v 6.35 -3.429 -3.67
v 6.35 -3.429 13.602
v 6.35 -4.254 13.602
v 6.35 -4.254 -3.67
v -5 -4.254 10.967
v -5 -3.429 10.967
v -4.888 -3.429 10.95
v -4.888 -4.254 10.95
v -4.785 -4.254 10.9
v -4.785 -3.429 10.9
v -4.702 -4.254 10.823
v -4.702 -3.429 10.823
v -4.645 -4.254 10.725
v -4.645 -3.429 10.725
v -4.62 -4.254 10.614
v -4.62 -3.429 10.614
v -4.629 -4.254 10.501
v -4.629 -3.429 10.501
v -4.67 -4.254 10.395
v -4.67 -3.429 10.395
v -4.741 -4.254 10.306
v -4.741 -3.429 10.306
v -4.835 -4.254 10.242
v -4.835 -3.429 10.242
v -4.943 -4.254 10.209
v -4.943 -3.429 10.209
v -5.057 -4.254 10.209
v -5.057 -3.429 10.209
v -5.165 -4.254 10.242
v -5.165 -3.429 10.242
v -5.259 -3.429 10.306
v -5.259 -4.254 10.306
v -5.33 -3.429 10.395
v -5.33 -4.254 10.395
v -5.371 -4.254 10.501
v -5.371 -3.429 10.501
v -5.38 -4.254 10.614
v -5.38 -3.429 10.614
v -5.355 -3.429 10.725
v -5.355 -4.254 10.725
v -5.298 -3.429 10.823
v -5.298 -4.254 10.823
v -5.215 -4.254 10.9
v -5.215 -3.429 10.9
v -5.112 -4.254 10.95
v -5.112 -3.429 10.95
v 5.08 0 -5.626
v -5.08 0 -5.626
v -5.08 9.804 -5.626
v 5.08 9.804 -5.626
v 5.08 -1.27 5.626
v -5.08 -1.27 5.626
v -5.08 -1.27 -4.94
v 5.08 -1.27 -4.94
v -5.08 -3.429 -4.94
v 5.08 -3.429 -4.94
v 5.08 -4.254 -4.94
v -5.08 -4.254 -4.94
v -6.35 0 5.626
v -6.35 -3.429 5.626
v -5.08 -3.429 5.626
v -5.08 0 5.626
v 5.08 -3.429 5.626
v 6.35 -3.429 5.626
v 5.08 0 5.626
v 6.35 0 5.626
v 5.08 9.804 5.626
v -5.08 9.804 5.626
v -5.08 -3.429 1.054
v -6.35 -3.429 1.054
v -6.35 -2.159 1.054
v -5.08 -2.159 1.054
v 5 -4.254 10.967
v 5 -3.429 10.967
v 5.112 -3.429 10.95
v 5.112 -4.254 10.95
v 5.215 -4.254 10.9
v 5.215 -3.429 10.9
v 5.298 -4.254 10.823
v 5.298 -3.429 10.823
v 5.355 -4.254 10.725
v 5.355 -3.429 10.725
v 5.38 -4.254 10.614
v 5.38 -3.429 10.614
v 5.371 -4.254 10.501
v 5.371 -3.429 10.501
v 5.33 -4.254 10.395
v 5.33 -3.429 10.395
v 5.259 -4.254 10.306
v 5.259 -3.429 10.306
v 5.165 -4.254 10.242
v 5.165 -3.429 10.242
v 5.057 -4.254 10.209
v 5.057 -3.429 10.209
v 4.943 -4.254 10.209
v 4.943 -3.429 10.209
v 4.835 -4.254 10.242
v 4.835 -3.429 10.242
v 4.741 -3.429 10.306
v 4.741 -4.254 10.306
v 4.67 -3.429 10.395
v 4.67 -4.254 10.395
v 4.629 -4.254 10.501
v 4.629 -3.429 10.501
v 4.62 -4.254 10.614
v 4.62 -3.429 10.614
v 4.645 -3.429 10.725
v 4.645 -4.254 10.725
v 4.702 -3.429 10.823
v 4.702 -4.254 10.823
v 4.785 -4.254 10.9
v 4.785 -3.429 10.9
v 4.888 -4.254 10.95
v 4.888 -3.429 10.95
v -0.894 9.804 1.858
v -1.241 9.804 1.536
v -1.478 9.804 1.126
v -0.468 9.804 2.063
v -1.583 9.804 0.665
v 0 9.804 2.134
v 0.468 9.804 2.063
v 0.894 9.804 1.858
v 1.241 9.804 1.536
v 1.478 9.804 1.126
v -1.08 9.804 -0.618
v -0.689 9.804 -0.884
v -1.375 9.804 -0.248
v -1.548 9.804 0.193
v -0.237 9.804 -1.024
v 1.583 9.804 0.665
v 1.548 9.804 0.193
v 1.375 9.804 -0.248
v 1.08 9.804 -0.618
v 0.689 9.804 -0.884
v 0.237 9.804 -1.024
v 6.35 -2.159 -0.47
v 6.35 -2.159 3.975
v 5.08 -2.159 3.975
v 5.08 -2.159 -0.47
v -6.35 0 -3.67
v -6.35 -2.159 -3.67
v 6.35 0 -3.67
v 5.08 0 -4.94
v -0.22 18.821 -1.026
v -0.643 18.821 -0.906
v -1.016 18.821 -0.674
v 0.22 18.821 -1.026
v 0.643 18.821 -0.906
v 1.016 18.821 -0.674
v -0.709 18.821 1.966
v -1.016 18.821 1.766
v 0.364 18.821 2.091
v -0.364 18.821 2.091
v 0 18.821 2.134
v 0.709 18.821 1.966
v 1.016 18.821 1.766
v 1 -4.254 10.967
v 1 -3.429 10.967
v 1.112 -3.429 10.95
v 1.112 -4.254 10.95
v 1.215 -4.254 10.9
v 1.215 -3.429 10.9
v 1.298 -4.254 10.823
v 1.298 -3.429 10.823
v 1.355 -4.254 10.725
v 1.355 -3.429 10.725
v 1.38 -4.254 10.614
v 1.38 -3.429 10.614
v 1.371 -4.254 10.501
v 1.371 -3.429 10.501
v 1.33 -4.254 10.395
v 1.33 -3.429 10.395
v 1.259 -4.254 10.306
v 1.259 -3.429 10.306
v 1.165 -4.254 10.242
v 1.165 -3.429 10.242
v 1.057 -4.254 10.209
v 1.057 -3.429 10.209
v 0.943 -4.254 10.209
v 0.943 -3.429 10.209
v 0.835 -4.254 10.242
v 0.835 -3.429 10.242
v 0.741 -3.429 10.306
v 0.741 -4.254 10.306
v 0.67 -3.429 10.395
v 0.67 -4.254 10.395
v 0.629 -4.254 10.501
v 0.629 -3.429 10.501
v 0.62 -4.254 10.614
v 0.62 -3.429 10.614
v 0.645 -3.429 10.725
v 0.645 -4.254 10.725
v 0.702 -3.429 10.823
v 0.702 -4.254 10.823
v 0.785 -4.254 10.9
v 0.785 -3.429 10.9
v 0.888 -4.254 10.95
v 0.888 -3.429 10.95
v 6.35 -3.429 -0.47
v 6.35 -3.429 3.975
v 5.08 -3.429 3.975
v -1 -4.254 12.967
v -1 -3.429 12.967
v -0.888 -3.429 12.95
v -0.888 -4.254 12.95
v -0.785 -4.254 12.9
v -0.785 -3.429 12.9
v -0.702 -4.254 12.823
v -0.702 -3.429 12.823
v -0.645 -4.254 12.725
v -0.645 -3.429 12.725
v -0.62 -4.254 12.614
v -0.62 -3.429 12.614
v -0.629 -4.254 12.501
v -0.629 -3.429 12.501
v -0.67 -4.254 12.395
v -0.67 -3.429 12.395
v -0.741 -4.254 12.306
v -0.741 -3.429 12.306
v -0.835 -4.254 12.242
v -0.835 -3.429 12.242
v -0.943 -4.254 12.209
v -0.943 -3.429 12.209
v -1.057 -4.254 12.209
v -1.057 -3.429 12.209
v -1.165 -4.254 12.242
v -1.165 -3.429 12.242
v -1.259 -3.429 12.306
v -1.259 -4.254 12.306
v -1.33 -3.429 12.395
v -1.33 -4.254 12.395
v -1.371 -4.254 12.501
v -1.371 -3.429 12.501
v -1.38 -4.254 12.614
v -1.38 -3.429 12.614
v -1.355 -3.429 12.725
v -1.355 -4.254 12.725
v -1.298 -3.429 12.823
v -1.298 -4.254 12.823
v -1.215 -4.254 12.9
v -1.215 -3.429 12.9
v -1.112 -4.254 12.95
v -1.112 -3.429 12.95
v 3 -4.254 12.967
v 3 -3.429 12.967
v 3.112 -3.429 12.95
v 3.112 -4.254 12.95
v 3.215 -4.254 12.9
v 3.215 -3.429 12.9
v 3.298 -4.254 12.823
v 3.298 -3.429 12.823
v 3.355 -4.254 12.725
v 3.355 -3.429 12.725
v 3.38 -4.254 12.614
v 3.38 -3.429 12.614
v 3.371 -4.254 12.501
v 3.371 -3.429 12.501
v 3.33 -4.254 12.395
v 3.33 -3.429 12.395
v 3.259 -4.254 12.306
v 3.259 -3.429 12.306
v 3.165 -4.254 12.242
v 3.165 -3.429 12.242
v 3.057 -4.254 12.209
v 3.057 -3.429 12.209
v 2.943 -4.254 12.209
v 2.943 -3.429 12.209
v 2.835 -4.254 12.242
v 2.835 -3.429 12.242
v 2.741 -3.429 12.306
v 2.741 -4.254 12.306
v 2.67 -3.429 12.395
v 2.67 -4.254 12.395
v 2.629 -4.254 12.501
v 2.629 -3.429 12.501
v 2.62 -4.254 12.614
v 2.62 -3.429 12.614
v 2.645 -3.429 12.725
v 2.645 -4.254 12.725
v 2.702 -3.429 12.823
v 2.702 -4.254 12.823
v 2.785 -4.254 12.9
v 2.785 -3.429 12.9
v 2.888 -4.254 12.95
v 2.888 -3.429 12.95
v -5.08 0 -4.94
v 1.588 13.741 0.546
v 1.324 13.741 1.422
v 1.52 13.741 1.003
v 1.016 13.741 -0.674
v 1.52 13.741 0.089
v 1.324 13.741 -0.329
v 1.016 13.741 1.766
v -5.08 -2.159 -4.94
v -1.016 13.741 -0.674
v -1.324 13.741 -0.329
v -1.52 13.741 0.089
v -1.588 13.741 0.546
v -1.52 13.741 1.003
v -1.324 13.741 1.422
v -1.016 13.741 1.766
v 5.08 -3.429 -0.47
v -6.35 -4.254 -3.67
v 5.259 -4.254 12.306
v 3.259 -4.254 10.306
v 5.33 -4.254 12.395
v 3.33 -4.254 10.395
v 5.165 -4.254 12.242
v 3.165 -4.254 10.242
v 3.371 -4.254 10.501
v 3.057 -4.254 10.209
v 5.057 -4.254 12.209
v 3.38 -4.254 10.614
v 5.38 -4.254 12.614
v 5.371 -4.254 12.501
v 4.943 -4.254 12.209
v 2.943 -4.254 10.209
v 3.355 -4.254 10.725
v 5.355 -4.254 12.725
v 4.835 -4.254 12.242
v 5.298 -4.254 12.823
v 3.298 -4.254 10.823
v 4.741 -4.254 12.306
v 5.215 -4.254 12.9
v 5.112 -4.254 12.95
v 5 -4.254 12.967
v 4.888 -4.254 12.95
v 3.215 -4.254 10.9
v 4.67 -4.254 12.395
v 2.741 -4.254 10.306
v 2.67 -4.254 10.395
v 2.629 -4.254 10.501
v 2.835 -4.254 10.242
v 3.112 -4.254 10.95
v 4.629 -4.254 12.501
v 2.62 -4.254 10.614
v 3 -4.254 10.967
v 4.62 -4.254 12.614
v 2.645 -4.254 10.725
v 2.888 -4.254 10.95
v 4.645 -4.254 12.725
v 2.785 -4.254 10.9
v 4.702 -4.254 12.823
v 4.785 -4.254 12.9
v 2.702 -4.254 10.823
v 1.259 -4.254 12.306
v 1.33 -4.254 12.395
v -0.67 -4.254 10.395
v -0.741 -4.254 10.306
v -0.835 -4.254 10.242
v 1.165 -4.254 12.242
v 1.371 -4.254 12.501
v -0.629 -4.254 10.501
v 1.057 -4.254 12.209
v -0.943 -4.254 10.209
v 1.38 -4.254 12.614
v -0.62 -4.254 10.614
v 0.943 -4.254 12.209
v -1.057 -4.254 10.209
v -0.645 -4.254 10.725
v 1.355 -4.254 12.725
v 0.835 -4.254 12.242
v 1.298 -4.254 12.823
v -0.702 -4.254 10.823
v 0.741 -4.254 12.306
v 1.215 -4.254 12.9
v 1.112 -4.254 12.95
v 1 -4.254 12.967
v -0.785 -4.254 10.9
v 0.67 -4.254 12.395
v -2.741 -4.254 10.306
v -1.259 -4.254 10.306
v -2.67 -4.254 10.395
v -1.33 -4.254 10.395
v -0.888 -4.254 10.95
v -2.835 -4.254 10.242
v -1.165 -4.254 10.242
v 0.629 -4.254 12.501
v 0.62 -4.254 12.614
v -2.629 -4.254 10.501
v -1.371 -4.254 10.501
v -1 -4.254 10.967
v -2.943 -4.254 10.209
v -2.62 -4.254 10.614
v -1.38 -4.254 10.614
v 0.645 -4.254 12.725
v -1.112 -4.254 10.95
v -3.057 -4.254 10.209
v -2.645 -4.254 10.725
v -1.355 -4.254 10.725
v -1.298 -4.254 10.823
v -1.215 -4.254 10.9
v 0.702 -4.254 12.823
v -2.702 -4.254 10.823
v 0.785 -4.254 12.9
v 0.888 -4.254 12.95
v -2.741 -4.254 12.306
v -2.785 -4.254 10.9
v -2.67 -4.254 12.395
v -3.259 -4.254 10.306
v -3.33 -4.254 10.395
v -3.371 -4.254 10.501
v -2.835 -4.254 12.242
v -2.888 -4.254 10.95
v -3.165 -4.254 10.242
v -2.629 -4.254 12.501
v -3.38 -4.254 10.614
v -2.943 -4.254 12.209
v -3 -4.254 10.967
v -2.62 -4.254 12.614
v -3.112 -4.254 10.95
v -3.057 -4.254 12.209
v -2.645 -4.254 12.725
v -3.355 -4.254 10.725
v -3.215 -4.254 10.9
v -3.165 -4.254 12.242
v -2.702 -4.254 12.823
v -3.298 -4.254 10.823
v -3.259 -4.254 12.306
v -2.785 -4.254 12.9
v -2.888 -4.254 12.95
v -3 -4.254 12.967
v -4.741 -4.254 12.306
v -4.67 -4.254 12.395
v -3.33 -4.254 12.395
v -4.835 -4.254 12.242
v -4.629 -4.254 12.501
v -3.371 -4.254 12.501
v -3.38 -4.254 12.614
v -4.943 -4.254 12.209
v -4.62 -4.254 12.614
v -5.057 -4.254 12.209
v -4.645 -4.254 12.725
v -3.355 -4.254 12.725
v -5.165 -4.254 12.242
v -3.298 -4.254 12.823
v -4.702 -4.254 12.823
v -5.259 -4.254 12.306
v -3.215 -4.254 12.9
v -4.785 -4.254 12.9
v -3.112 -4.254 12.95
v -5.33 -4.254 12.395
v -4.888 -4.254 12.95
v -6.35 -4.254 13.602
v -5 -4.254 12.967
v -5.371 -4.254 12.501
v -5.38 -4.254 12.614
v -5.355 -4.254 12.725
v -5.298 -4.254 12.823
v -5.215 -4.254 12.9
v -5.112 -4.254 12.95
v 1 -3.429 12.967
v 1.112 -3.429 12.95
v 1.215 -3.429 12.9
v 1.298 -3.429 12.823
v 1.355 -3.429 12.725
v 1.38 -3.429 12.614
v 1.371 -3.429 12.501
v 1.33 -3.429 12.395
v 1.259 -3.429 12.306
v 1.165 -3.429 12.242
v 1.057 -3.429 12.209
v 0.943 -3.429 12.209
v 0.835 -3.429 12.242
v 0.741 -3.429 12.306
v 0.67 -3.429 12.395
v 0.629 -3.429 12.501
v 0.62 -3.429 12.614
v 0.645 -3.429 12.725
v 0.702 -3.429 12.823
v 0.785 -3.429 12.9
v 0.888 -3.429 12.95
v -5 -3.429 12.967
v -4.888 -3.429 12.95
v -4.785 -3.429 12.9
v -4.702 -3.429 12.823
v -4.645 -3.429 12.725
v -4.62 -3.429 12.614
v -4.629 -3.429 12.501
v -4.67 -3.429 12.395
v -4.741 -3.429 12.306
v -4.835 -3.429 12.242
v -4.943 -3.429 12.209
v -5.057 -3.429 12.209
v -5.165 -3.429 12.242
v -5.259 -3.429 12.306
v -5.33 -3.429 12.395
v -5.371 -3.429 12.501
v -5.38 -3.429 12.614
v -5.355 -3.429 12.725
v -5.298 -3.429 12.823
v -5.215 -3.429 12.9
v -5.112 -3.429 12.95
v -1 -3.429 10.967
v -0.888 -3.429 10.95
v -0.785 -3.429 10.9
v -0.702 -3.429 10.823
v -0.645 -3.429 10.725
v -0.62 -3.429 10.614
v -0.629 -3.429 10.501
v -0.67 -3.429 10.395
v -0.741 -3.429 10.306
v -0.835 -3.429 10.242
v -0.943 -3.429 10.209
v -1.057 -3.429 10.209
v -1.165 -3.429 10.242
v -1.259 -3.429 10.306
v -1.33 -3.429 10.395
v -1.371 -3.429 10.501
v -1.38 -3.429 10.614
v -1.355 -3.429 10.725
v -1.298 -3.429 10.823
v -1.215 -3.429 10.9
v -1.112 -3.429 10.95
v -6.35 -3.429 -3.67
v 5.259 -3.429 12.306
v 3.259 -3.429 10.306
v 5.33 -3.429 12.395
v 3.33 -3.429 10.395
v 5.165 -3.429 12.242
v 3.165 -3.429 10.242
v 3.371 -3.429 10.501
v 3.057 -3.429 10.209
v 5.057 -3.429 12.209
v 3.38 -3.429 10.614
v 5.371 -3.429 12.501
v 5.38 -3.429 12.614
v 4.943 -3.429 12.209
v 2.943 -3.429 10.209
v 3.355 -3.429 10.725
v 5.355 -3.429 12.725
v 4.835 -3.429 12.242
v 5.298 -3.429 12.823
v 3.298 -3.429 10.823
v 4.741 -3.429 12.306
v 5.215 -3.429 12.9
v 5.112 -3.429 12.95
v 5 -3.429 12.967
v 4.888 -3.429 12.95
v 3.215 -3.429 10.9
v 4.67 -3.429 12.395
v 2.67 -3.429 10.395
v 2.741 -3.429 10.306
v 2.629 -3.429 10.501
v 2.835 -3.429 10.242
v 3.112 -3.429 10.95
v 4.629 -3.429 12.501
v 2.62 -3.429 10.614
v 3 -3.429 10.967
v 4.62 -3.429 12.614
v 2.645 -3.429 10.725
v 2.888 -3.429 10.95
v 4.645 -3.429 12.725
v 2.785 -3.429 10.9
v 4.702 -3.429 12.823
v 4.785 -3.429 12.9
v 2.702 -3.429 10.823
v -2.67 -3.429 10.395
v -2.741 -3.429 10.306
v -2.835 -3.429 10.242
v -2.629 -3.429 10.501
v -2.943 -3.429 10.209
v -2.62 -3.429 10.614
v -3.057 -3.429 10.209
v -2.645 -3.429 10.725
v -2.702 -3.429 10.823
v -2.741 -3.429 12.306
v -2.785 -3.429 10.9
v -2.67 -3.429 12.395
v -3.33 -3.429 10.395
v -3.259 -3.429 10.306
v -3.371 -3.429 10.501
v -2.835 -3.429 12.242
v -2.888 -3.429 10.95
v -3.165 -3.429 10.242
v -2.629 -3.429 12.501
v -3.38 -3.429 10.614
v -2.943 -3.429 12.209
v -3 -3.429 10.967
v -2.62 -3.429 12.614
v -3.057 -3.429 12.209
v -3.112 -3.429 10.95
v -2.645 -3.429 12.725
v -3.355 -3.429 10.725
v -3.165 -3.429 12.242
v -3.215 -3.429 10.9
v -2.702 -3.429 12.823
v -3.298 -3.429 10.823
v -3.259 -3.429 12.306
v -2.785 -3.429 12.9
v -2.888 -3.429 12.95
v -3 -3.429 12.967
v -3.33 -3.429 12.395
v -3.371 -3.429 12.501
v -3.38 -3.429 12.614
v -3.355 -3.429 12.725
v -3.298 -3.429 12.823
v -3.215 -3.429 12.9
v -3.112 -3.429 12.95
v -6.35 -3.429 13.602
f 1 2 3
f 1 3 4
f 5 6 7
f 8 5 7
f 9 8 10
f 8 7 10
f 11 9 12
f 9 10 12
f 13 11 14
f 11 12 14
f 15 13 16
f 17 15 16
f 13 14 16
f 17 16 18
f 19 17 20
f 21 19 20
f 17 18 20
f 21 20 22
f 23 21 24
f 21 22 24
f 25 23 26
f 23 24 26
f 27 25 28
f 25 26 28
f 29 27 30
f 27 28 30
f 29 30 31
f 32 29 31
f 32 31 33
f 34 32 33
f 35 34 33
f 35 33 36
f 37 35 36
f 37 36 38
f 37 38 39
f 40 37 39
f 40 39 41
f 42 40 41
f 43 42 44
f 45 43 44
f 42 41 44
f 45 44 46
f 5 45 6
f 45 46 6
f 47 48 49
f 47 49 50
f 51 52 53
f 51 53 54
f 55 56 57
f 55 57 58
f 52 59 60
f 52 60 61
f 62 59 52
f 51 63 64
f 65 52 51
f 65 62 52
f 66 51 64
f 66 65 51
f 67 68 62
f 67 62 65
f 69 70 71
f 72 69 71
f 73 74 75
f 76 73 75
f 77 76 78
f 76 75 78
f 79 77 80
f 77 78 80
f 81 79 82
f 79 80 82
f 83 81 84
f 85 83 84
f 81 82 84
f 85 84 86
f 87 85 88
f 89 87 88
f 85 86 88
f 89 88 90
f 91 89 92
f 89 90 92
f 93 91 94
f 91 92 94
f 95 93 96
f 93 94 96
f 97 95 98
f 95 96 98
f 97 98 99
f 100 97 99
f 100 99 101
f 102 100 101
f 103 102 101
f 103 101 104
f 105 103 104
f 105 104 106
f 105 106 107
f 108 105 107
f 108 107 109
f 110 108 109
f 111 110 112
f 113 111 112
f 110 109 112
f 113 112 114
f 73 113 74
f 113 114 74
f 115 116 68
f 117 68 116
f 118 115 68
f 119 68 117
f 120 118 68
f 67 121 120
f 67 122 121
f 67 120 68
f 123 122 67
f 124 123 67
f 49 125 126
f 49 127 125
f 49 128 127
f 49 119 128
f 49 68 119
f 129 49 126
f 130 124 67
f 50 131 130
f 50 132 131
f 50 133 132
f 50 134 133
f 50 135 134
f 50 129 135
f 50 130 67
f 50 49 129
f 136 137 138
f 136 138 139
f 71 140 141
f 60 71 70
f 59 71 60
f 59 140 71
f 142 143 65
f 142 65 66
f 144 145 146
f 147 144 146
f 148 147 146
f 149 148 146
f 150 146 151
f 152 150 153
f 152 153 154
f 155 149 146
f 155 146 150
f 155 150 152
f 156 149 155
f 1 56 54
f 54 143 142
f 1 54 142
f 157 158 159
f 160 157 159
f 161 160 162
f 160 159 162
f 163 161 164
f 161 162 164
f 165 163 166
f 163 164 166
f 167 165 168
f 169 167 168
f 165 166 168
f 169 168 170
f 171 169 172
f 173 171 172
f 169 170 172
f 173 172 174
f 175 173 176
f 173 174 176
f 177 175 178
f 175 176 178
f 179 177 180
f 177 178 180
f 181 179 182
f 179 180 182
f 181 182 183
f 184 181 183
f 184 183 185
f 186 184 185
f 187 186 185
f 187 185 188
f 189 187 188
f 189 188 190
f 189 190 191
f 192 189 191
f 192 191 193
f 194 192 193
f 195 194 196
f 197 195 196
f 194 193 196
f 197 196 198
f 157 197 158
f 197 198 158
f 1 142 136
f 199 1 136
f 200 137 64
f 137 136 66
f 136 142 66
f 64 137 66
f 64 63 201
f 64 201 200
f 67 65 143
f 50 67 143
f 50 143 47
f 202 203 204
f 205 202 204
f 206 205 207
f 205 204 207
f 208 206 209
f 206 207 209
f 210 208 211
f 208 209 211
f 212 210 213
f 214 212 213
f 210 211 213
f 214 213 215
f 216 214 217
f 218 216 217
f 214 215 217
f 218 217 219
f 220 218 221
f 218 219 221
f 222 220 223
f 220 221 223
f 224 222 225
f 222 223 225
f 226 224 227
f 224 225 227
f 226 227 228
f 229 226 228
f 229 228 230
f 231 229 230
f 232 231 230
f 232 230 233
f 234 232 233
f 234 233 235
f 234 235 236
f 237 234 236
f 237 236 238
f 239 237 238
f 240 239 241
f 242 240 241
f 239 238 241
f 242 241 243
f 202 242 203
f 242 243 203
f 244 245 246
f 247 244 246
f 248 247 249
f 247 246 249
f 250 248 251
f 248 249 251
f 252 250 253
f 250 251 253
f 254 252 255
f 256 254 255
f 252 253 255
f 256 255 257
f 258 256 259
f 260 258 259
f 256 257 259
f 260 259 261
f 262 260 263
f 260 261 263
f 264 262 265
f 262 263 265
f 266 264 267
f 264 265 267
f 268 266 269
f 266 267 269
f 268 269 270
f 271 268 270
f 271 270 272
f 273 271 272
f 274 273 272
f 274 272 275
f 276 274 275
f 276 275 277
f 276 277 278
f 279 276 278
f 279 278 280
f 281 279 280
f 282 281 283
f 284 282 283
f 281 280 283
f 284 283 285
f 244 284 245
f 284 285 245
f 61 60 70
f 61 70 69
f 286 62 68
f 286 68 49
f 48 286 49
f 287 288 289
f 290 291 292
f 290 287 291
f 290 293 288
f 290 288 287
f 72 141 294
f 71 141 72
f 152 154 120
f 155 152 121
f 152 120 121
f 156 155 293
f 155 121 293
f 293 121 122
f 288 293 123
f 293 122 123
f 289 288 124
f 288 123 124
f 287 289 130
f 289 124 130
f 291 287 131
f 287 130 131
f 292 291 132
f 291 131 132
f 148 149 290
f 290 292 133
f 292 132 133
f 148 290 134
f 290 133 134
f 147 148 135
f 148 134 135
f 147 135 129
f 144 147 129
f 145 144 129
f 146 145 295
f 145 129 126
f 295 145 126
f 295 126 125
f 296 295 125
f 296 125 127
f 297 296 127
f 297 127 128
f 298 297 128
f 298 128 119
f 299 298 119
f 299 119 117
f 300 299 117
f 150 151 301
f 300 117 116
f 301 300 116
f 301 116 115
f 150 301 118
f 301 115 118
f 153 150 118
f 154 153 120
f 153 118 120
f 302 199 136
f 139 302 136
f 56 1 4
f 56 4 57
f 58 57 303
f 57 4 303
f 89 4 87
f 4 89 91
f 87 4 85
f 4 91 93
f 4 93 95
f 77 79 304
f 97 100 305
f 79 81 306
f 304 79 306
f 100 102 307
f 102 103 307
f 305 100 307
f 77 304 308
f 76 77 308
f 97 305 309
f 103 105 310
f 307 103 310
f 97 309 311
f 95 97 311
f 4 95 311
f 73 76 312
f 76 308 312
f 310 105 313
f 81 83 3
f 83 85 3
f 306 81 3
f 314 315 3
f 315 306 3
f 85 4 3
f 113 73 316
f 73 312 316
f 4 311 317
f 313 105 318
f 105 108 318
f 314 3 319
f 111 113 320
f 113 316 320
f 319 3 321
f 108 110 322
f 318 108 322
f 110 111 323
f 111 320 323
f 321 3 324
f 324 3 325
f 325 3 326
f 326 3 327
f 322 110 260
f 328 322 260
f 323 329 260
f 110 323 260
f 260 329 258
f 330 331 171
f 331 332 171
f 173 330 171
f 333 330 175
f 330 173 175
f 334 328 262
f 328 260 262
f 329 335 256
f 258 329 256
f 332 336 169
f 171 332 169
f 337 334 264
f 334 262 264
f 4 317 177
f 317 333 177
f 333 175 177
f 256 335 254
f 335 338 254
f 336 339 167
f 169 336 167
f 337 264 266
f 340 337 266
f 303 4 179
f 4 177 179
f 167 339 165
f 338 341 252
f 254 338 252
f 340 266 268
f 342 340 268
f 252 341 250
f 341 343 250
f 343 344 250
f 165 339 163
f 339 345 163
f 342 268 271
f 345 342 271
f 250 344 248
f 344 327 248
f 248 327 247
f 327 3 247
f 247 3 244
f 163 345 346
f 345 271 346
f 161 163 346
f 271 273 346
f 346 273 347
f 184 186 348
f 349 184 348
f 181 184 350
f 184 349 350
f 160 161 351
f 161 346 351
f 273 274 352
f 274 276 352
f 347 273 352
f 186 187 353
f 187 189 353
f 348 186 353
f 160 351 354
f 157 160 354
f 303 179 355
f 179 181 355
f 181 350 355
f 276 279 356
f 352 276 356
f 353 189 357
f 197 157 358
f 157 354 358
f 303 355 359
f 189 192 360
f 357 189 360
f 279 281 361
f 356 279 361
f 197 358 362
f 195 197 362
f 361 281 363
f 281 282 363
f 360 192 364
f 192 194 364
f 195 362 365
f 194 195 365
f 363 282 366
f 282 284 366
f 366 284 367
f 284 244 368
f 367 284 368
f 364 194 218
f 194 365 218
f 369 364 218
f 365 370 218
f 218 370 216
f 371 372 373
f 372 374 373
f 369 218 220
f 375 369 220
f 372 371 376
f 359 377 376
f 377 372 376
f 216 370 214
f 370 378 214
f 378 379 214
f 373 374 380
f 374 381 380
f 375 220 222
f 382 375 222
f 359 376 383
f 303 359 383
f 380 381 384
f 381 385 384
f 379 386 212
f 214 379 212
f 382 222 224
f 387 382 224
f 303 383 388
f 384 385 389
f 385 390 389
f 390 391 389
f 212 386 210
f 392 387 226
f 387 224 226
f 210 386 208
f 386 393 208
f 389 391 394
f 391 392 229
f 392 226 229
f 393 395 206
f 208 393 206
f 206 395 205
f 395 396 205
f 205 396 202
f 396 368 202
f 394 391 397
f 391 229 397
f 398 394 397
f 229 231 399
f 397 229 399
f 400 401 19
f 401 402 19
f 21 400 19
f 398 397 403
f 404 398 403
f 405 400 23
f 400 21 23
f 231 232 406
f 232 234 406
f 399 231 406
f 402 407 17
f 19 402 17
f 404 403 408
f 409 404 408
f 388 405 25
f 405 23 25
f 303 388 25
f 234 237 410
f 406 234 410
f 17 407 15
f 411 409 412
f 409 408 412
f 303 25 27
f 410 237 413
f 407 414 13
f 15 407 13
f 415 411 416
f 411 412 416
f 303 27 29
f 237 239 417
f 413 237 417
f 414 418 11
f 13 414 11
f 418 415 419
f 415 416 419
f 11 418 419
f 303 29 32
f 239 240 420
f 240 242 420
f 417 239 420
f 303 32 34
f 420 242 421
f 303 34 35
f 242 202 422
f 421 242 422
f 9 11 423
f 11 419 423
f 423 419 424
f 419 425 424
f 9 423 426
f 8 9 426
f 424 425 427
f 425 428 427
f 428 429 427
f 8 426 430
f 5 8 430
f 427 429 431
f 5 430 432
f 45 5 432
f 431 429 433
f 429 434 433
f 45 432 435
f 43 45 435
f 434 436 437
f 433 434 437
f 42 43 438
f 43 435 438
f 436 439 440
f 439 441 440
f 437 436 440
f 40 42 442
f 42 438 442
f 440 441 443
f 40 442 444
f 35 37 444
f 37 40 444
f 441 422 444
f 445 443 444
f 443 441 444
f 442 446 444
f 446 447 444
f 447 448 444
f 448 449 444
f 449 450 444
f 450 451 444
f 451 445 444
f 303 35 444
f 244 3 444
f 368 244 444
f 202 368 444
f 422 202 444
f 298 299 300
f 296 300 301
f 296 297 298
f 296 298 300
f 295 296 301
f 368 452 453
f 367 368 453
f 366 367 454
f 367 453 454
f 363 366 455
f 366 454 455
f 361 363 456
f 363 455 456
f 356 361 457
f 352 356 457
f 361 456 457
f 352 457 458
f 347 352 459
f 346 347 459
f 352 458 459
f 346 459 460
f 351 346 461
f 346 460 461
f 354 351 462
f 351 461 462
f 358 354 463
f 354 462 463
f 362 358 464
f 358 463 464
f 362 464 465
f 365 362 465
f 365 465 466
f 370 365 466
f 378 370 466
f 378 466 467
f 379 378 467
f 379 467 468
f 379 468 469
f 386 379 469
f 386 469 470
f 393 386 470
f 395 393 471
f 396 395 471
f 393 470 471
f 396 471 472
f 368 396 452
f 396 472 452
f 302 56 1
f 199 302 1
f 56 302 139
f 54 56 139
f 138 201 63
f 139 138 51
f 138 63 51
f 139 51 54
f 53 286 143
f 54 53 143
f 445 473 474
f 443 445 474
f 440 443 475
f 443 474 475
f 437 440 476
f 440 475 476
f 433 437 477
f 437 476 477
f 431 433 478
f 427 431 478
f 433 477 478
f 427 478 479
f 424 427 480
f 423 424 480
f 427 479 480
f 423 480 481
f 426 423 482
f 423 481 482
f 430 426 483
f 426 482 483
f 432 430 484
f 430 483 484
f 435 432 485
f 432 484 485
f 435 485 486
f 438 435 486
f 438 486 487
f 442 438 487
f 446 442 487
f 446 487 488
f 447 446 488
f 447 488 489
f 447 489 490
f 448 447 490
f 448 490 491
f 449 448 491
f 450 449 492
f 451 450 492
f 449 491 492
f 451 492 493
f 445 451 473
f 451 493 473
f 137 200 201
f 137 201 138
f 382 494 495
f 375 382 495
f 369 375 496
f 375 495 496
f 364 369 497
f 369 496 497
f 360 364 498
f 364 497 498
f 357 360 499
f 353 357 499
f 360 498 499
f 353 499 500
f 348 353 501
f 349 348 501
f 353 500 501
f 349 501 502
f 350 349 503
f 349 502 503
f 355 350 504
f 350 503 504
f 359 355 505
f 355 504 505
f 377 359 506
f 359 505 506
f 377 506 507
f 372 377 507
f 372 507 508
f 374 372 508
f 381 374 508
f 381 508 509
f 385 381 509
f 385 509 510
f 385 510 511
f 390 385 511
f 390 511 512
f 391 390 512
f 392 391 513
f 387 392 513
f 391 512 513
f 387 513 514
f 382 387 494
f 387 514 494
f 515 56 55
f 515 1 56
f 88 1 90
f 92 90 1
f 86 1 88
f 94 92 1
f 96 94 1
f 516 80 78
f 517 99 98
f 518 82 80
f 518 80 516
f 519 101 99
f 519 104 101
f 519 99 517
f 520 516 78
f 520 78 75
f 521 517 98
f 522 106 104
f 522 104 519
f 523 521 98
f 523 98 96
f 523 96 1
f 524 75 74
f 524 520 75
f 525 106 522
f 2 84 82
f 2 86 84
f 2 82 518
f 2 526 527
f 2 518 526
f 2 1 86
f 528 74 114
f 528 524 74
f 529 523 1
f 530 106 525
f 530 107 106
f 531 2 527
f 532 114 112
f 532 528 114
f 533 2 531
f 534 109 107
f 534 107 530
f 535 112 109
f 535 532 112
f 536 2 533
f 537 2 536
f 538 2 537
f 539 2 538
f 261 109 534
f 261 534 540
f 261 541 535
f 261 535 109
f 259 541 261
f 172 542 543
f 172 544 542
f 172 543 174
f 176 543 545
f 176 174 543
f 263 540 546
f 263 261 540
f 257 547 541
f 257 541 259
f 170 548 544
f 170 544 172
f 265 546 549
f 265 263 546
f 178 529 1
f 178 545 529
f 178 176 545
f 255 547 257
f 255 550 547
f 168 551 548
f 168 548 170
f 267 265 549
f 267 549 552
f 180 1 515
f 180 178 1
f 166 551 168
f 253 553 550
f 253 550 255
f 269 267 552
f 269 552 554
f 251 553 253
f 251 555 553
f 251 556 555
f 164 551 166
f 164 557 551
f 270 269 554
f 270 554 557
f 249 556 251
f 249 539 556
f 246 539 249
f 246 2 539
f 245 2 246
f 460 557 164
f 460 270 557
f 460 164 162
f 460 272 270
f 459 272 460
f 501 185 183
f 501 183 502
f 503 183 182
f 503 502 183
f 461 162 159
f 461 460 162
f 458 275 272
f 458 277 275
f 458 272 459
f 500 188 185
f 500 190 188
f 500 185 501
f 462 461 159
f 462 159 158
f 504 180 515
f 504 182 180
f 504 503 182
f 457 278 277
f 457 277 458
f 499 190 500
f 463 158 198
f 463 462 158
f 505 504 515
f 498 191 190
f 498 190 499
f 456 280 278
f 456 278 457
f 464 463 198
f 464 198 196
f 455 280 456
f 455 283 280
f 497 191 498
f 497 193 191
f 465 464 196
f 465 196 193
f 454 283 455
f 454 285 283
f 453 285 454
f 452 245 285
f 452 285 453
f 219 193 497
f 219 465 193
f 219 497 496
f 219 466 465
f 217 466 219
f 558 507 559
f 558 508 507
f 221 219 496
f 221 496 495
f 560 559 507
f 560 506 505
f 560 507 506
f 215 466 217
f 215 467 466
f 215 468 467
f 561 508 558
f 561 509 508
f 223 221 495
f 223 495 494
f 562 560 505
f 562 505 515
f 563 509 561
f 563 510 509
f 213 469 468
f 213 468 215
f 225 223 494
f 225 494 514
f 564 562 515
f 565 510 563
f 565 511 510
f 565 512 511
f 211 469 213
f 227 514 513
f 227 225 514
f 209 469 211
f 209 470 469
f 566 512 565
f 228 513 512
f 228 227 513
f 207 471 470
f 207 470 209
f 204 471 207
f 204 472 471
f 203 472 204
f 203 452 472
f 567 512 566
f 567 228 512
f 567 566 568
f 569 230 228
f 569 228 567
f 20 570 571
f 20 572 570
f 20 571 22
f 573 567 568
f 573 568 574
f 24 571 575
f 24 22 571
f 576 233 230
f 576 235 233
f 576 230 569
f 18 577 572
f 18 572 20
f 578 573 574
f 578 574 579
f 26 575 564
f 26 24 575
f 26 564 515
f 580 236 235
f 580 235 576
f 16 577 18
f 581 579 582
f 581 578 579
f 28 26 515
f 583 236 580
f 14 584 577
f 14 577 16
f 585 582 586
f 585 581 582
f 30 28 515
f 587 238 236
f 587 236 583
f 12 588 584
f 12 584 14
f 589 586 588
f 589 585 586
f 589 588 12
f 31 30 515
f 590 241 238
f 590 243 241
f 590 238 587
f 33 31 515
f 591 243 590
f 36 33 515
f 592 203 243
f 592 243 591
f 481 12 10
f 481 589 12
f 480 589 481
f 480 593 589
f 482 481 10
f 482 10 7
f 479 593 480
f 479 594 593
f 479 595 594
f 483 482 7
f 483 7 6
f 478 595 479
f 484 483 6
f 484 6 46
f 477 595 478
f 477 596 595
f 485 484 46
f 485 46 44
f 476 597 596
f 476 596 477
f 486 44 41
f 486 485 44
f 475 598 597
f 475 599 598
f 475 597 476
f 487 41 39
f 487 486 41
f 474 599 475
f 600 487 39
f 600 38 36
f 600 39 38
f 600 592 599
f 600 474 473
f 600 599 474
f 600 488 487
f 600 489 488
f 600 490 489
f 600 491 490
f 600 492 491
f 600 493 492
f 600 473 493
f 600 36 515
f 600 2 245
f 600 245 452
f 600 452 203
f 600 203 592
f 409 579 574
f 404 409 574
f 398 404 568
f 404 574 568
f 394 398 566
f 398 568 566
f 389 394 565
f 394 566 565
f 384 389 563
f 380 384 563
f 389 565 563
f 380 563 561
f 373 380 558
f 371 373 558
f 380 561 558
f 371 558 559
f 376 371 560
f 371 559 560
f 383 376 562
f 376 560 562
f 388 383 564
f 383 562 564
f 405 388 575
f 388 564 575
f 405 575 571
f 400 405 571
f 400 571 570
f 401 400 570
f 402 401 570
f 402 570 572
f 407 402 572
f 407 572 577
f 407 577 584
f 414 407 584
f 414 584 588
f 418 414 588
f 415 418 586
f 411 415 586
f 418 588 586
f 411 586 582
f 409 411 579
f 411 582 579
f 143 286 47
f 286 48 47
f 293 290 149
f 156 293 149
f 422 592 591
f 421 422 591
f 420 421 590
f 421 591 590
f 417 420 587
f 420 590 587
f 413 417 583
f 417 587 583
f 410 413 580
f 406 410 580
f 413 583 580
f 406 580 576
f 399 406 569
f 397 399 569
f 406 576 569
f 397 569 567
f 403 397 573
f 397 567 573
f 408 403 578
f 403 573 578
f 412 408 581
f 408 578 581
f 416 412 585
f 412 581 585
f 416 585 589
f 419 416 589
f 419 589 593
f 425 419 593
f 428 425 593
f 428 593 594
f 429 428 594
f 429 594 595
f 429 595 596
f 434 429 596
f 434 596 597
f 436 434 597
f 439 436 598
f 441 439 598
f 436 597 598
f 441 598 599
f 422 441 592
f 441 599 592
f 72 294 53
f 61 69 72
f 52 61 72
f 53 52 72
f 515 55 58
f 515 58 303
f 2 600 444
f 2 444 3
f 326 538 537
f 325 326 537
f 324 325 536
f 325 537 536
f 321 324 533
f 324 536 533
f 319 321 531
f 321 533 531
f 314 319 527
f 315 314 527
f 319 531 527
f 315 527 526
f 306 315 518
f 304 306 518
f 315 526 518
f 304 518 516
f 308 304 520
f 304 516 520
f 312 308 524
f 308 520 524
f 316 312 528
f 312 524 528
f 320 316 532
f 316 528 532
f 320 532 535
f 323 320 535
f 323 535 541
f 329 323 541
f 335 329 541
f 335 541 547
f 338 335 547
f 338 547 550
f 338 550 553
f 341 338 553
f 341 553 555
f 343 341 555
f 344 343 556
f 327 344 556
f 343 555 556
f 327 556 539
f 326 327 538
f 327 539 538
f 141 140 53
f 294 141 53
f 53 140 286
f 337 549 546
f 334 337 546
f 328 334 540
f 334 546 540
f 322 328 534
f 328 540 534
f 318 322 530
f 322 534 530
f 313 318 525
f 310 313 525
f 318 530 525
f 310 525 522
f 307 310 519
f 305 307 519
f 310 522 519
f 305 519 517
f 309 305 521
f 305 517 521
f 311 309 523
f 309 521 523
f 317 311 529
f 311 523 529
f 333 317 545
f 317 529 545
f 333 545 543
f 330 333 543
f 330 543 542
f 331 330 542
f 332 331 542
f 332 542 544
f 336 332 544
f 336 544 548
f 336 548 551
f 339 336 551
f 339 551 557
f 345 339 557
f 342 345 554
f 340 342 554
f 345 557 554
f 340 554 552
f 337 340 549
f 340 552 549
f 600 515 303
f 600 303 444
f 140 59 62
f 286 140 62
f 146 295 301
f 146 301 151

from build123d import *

# Parameters (mm, degrees)
SKETCH1_W            = 10.16
SKETCH1_H            = 11.2522
EXTRUDE1_DEPTH       = 9.8044
SKETCH2_R            = 1.5875
EXTRUDE2_DEPTH       = 9.017
EXTRUDE3_DEPTH       = 21.290502684
EXTRUDE3_DEPTH_BACK  = 21.290502684
SKETCH3_W            = 0.5715
SKETCH3_H            = 5.08
SKETCH4_W            = 12.7
SKETCH4_H            = 10.5664
EXTRUDE4_DEPTH       = 3.429
SKETCH5_W            = 10.16
SKETCH5_H            = 2.159
EXTRUDE5_DEPTH       = 23.829358353
SKETCH6_W            = 4.445
SKETCH6_H            = 1.27
EXTRUDE6_DEPTH       = 1.27
SKETCH7_W            = 5.9944
SKETCH7_H            = 1.27
EXTRUDE7_DEPTH       = 1.27
EXTRUDE8_REACH       = 22.645
PCB_DEPTH            = 0.8255
SKETCH10_R           = 0.381
EXTRUDE10_DEPTH      = 0.8255
LPATTERN1_COUNT      = 6
LPATTERN1_PITCH      = 2
LPATTERN1_COUNT_DIR2 = 2
LPATTERN1_PITCH_DIR2 = 2


with BuildPart() as part:
    # Sketch1 → Extrude1 (new body)
    with BuildSketch(Plane(origin=(0, 0, 0), x_dir=(1, 0, 0), z_dir=(0, 1, 0))):
        Rectangle(SKETCH1_W, SKETCH1_H)
    extrude(amount=EXTRUDE1_DEPTH)

    # Sketch2 → Extrude2 (add)
    with BuildSketch(Plane(origin=(0, 9.8044, 0), x_dir=(1, 0, 0), z_dir=(0, 1, 0))):
        with Locations(Location((0, -0.5461, 0), (0, 0, 270))):
            Circle(SKETCH2_R)
    extrude(amount=EXTRUDE2_DEPTH)

    # Sketch3 → Extrude3 (cut, two sides: drawn at the far end of the back side and taken through both)
    with BuildSketch(Plane.XY.offset(-EXTRUDE3_DEPTH_BACK)):
        with Locations((-1.30175, 16.2814)):
            Rectangle(SKETCH3_W, SKETCH3_H)
        with Locations((1.30175, 16.2814)):
            Rectangle(SKETCH3_W, SKETCH3_H)
    extrude(amount=EXTRUDE3_DEPTH + EXTRUDE3_DEPTH_BACK, mode=Mode.SUBTRACT)

    # Sketch4 → Extrude4 (add)
    with BuildSketch(Plane.XZ):
        with Locations((0, 0.3429)):
            Rectangle(SKETCH4_W, SKETCH4_H)
    extrude(amount=EXTRUDE4_DEPTH)

    # Sketch5 → Extrude5 (cut, through all)
    with BuildSketch(Plane.XY.offset(5.6261)):
        with Locations((0, -2.3495)):
            Rectangle(SKETCH5_W, SKETCH5_H)
    extrude(amount=-EXTRUDE5_DEPTH, mode=Mode.SUBTRACT)

    # Sketch6 → Extrude6 (cut)
    with BuildSketch(Plane(origin=(6.35, 0, 0), x_dir=(0, 0, -1), z_dir=(1, 0, 0))):
        with Locations((-1.7526, -2.794)):
            Rectangle(SKETCH6_W, SKETCH6_H)
    extrude(amount=-EXTRUDE6_DEPTH, mode=Mode.SUBTRACT)

    # Sketch7 → Extrude7 (cut)
    with BuildSketch(Plane.ZY.offset(6.35)):
        with Locations((-1.9431, -2.794)):
            Rectangle(SKETCH7_W, SKETCH7_H)
    extrude(amount=-EXTRUDE7_DEPTH, mode=Mode.SUBTRACT)

    # Extrude8: up to this face of the body (flat: up to its plane)
    extrude8_end = Plane(part.part.faces().sort_by_distance((5.715, -3.429, -2.7051))[0])
    # Sketch8 → Extrude8 (cut, up to the picked face)
    with BuildSketch(Plane(origin=(0, 0, 0), x_dir=(1, 0, 0), z_dir=(0, 1, 0)), mode=Mode.PRIVATE) as extrude8_sk1:
        Polygon((5.08, 4.9403), (6.35, 3.6703), (6.35, 4.9403), (6.35, 5.384756182), (-6.35, 5.384756182), (-6.35, 3.6703), (-5.08, 4.9403), align=None)
    extrude8_tool1 = split(extrude(extrude8_sk1.sketch, amount=-EXTRUDE8_REACH, mode=Mode.PRIVATE), bisect_by=extrude8_end, keep=Keep.BOTH, mode=Mode.PRIVATE)
    add(extrude8_tool1.solids().sort_by(Axis((0, 0, -5.019059), (0, -1, 0)))[0], mode=Mode.SUBTRACT)


with BuildPart() as body_2:
    # Sketch9 → PCB (new body)
    with BuildSketch(Plane.XZ.offset(3.429)):
        Polygon((5.08, -4.9403), (-5.08, -4.9403), (-6.35, -3.6703), (-6.35, 13.6017), (6.35, 13.6017), (6.35, -3.6703), align=None)
    extrude(amount=PCB_DEPTH)

    # Sketch10 → Extrude10 (cut)
    with BuildSketch(Plane(origin=(0, -3.429, 0), x_dir=(1, 0, 0), z_dir=(0, 1, 0))):
        with Locations(Location((-5, -12.5857, 0), (0, 0, 270))):
            Circle(SKETCH10_R)
    extrude10 = extrude(amount=-EXTRUDE10_DEPTH, mode=Mode.SUBTRACT)

    # LPattern1: Extrude10 6 × 2
    with Locations(*[(i * LPATTERN1_PITCH, 0, -j * LPATTERN1_PITCH_DIR2) for i in range(LPATTERN1_COUNT) for j in range(LPATTERN1_COUNT_DIR2) if (i, j) != (0, 0)]):
        add(extrude10, mode=Mode.SUBTRACT)


solid = Compound([part.part, body_2.part])
